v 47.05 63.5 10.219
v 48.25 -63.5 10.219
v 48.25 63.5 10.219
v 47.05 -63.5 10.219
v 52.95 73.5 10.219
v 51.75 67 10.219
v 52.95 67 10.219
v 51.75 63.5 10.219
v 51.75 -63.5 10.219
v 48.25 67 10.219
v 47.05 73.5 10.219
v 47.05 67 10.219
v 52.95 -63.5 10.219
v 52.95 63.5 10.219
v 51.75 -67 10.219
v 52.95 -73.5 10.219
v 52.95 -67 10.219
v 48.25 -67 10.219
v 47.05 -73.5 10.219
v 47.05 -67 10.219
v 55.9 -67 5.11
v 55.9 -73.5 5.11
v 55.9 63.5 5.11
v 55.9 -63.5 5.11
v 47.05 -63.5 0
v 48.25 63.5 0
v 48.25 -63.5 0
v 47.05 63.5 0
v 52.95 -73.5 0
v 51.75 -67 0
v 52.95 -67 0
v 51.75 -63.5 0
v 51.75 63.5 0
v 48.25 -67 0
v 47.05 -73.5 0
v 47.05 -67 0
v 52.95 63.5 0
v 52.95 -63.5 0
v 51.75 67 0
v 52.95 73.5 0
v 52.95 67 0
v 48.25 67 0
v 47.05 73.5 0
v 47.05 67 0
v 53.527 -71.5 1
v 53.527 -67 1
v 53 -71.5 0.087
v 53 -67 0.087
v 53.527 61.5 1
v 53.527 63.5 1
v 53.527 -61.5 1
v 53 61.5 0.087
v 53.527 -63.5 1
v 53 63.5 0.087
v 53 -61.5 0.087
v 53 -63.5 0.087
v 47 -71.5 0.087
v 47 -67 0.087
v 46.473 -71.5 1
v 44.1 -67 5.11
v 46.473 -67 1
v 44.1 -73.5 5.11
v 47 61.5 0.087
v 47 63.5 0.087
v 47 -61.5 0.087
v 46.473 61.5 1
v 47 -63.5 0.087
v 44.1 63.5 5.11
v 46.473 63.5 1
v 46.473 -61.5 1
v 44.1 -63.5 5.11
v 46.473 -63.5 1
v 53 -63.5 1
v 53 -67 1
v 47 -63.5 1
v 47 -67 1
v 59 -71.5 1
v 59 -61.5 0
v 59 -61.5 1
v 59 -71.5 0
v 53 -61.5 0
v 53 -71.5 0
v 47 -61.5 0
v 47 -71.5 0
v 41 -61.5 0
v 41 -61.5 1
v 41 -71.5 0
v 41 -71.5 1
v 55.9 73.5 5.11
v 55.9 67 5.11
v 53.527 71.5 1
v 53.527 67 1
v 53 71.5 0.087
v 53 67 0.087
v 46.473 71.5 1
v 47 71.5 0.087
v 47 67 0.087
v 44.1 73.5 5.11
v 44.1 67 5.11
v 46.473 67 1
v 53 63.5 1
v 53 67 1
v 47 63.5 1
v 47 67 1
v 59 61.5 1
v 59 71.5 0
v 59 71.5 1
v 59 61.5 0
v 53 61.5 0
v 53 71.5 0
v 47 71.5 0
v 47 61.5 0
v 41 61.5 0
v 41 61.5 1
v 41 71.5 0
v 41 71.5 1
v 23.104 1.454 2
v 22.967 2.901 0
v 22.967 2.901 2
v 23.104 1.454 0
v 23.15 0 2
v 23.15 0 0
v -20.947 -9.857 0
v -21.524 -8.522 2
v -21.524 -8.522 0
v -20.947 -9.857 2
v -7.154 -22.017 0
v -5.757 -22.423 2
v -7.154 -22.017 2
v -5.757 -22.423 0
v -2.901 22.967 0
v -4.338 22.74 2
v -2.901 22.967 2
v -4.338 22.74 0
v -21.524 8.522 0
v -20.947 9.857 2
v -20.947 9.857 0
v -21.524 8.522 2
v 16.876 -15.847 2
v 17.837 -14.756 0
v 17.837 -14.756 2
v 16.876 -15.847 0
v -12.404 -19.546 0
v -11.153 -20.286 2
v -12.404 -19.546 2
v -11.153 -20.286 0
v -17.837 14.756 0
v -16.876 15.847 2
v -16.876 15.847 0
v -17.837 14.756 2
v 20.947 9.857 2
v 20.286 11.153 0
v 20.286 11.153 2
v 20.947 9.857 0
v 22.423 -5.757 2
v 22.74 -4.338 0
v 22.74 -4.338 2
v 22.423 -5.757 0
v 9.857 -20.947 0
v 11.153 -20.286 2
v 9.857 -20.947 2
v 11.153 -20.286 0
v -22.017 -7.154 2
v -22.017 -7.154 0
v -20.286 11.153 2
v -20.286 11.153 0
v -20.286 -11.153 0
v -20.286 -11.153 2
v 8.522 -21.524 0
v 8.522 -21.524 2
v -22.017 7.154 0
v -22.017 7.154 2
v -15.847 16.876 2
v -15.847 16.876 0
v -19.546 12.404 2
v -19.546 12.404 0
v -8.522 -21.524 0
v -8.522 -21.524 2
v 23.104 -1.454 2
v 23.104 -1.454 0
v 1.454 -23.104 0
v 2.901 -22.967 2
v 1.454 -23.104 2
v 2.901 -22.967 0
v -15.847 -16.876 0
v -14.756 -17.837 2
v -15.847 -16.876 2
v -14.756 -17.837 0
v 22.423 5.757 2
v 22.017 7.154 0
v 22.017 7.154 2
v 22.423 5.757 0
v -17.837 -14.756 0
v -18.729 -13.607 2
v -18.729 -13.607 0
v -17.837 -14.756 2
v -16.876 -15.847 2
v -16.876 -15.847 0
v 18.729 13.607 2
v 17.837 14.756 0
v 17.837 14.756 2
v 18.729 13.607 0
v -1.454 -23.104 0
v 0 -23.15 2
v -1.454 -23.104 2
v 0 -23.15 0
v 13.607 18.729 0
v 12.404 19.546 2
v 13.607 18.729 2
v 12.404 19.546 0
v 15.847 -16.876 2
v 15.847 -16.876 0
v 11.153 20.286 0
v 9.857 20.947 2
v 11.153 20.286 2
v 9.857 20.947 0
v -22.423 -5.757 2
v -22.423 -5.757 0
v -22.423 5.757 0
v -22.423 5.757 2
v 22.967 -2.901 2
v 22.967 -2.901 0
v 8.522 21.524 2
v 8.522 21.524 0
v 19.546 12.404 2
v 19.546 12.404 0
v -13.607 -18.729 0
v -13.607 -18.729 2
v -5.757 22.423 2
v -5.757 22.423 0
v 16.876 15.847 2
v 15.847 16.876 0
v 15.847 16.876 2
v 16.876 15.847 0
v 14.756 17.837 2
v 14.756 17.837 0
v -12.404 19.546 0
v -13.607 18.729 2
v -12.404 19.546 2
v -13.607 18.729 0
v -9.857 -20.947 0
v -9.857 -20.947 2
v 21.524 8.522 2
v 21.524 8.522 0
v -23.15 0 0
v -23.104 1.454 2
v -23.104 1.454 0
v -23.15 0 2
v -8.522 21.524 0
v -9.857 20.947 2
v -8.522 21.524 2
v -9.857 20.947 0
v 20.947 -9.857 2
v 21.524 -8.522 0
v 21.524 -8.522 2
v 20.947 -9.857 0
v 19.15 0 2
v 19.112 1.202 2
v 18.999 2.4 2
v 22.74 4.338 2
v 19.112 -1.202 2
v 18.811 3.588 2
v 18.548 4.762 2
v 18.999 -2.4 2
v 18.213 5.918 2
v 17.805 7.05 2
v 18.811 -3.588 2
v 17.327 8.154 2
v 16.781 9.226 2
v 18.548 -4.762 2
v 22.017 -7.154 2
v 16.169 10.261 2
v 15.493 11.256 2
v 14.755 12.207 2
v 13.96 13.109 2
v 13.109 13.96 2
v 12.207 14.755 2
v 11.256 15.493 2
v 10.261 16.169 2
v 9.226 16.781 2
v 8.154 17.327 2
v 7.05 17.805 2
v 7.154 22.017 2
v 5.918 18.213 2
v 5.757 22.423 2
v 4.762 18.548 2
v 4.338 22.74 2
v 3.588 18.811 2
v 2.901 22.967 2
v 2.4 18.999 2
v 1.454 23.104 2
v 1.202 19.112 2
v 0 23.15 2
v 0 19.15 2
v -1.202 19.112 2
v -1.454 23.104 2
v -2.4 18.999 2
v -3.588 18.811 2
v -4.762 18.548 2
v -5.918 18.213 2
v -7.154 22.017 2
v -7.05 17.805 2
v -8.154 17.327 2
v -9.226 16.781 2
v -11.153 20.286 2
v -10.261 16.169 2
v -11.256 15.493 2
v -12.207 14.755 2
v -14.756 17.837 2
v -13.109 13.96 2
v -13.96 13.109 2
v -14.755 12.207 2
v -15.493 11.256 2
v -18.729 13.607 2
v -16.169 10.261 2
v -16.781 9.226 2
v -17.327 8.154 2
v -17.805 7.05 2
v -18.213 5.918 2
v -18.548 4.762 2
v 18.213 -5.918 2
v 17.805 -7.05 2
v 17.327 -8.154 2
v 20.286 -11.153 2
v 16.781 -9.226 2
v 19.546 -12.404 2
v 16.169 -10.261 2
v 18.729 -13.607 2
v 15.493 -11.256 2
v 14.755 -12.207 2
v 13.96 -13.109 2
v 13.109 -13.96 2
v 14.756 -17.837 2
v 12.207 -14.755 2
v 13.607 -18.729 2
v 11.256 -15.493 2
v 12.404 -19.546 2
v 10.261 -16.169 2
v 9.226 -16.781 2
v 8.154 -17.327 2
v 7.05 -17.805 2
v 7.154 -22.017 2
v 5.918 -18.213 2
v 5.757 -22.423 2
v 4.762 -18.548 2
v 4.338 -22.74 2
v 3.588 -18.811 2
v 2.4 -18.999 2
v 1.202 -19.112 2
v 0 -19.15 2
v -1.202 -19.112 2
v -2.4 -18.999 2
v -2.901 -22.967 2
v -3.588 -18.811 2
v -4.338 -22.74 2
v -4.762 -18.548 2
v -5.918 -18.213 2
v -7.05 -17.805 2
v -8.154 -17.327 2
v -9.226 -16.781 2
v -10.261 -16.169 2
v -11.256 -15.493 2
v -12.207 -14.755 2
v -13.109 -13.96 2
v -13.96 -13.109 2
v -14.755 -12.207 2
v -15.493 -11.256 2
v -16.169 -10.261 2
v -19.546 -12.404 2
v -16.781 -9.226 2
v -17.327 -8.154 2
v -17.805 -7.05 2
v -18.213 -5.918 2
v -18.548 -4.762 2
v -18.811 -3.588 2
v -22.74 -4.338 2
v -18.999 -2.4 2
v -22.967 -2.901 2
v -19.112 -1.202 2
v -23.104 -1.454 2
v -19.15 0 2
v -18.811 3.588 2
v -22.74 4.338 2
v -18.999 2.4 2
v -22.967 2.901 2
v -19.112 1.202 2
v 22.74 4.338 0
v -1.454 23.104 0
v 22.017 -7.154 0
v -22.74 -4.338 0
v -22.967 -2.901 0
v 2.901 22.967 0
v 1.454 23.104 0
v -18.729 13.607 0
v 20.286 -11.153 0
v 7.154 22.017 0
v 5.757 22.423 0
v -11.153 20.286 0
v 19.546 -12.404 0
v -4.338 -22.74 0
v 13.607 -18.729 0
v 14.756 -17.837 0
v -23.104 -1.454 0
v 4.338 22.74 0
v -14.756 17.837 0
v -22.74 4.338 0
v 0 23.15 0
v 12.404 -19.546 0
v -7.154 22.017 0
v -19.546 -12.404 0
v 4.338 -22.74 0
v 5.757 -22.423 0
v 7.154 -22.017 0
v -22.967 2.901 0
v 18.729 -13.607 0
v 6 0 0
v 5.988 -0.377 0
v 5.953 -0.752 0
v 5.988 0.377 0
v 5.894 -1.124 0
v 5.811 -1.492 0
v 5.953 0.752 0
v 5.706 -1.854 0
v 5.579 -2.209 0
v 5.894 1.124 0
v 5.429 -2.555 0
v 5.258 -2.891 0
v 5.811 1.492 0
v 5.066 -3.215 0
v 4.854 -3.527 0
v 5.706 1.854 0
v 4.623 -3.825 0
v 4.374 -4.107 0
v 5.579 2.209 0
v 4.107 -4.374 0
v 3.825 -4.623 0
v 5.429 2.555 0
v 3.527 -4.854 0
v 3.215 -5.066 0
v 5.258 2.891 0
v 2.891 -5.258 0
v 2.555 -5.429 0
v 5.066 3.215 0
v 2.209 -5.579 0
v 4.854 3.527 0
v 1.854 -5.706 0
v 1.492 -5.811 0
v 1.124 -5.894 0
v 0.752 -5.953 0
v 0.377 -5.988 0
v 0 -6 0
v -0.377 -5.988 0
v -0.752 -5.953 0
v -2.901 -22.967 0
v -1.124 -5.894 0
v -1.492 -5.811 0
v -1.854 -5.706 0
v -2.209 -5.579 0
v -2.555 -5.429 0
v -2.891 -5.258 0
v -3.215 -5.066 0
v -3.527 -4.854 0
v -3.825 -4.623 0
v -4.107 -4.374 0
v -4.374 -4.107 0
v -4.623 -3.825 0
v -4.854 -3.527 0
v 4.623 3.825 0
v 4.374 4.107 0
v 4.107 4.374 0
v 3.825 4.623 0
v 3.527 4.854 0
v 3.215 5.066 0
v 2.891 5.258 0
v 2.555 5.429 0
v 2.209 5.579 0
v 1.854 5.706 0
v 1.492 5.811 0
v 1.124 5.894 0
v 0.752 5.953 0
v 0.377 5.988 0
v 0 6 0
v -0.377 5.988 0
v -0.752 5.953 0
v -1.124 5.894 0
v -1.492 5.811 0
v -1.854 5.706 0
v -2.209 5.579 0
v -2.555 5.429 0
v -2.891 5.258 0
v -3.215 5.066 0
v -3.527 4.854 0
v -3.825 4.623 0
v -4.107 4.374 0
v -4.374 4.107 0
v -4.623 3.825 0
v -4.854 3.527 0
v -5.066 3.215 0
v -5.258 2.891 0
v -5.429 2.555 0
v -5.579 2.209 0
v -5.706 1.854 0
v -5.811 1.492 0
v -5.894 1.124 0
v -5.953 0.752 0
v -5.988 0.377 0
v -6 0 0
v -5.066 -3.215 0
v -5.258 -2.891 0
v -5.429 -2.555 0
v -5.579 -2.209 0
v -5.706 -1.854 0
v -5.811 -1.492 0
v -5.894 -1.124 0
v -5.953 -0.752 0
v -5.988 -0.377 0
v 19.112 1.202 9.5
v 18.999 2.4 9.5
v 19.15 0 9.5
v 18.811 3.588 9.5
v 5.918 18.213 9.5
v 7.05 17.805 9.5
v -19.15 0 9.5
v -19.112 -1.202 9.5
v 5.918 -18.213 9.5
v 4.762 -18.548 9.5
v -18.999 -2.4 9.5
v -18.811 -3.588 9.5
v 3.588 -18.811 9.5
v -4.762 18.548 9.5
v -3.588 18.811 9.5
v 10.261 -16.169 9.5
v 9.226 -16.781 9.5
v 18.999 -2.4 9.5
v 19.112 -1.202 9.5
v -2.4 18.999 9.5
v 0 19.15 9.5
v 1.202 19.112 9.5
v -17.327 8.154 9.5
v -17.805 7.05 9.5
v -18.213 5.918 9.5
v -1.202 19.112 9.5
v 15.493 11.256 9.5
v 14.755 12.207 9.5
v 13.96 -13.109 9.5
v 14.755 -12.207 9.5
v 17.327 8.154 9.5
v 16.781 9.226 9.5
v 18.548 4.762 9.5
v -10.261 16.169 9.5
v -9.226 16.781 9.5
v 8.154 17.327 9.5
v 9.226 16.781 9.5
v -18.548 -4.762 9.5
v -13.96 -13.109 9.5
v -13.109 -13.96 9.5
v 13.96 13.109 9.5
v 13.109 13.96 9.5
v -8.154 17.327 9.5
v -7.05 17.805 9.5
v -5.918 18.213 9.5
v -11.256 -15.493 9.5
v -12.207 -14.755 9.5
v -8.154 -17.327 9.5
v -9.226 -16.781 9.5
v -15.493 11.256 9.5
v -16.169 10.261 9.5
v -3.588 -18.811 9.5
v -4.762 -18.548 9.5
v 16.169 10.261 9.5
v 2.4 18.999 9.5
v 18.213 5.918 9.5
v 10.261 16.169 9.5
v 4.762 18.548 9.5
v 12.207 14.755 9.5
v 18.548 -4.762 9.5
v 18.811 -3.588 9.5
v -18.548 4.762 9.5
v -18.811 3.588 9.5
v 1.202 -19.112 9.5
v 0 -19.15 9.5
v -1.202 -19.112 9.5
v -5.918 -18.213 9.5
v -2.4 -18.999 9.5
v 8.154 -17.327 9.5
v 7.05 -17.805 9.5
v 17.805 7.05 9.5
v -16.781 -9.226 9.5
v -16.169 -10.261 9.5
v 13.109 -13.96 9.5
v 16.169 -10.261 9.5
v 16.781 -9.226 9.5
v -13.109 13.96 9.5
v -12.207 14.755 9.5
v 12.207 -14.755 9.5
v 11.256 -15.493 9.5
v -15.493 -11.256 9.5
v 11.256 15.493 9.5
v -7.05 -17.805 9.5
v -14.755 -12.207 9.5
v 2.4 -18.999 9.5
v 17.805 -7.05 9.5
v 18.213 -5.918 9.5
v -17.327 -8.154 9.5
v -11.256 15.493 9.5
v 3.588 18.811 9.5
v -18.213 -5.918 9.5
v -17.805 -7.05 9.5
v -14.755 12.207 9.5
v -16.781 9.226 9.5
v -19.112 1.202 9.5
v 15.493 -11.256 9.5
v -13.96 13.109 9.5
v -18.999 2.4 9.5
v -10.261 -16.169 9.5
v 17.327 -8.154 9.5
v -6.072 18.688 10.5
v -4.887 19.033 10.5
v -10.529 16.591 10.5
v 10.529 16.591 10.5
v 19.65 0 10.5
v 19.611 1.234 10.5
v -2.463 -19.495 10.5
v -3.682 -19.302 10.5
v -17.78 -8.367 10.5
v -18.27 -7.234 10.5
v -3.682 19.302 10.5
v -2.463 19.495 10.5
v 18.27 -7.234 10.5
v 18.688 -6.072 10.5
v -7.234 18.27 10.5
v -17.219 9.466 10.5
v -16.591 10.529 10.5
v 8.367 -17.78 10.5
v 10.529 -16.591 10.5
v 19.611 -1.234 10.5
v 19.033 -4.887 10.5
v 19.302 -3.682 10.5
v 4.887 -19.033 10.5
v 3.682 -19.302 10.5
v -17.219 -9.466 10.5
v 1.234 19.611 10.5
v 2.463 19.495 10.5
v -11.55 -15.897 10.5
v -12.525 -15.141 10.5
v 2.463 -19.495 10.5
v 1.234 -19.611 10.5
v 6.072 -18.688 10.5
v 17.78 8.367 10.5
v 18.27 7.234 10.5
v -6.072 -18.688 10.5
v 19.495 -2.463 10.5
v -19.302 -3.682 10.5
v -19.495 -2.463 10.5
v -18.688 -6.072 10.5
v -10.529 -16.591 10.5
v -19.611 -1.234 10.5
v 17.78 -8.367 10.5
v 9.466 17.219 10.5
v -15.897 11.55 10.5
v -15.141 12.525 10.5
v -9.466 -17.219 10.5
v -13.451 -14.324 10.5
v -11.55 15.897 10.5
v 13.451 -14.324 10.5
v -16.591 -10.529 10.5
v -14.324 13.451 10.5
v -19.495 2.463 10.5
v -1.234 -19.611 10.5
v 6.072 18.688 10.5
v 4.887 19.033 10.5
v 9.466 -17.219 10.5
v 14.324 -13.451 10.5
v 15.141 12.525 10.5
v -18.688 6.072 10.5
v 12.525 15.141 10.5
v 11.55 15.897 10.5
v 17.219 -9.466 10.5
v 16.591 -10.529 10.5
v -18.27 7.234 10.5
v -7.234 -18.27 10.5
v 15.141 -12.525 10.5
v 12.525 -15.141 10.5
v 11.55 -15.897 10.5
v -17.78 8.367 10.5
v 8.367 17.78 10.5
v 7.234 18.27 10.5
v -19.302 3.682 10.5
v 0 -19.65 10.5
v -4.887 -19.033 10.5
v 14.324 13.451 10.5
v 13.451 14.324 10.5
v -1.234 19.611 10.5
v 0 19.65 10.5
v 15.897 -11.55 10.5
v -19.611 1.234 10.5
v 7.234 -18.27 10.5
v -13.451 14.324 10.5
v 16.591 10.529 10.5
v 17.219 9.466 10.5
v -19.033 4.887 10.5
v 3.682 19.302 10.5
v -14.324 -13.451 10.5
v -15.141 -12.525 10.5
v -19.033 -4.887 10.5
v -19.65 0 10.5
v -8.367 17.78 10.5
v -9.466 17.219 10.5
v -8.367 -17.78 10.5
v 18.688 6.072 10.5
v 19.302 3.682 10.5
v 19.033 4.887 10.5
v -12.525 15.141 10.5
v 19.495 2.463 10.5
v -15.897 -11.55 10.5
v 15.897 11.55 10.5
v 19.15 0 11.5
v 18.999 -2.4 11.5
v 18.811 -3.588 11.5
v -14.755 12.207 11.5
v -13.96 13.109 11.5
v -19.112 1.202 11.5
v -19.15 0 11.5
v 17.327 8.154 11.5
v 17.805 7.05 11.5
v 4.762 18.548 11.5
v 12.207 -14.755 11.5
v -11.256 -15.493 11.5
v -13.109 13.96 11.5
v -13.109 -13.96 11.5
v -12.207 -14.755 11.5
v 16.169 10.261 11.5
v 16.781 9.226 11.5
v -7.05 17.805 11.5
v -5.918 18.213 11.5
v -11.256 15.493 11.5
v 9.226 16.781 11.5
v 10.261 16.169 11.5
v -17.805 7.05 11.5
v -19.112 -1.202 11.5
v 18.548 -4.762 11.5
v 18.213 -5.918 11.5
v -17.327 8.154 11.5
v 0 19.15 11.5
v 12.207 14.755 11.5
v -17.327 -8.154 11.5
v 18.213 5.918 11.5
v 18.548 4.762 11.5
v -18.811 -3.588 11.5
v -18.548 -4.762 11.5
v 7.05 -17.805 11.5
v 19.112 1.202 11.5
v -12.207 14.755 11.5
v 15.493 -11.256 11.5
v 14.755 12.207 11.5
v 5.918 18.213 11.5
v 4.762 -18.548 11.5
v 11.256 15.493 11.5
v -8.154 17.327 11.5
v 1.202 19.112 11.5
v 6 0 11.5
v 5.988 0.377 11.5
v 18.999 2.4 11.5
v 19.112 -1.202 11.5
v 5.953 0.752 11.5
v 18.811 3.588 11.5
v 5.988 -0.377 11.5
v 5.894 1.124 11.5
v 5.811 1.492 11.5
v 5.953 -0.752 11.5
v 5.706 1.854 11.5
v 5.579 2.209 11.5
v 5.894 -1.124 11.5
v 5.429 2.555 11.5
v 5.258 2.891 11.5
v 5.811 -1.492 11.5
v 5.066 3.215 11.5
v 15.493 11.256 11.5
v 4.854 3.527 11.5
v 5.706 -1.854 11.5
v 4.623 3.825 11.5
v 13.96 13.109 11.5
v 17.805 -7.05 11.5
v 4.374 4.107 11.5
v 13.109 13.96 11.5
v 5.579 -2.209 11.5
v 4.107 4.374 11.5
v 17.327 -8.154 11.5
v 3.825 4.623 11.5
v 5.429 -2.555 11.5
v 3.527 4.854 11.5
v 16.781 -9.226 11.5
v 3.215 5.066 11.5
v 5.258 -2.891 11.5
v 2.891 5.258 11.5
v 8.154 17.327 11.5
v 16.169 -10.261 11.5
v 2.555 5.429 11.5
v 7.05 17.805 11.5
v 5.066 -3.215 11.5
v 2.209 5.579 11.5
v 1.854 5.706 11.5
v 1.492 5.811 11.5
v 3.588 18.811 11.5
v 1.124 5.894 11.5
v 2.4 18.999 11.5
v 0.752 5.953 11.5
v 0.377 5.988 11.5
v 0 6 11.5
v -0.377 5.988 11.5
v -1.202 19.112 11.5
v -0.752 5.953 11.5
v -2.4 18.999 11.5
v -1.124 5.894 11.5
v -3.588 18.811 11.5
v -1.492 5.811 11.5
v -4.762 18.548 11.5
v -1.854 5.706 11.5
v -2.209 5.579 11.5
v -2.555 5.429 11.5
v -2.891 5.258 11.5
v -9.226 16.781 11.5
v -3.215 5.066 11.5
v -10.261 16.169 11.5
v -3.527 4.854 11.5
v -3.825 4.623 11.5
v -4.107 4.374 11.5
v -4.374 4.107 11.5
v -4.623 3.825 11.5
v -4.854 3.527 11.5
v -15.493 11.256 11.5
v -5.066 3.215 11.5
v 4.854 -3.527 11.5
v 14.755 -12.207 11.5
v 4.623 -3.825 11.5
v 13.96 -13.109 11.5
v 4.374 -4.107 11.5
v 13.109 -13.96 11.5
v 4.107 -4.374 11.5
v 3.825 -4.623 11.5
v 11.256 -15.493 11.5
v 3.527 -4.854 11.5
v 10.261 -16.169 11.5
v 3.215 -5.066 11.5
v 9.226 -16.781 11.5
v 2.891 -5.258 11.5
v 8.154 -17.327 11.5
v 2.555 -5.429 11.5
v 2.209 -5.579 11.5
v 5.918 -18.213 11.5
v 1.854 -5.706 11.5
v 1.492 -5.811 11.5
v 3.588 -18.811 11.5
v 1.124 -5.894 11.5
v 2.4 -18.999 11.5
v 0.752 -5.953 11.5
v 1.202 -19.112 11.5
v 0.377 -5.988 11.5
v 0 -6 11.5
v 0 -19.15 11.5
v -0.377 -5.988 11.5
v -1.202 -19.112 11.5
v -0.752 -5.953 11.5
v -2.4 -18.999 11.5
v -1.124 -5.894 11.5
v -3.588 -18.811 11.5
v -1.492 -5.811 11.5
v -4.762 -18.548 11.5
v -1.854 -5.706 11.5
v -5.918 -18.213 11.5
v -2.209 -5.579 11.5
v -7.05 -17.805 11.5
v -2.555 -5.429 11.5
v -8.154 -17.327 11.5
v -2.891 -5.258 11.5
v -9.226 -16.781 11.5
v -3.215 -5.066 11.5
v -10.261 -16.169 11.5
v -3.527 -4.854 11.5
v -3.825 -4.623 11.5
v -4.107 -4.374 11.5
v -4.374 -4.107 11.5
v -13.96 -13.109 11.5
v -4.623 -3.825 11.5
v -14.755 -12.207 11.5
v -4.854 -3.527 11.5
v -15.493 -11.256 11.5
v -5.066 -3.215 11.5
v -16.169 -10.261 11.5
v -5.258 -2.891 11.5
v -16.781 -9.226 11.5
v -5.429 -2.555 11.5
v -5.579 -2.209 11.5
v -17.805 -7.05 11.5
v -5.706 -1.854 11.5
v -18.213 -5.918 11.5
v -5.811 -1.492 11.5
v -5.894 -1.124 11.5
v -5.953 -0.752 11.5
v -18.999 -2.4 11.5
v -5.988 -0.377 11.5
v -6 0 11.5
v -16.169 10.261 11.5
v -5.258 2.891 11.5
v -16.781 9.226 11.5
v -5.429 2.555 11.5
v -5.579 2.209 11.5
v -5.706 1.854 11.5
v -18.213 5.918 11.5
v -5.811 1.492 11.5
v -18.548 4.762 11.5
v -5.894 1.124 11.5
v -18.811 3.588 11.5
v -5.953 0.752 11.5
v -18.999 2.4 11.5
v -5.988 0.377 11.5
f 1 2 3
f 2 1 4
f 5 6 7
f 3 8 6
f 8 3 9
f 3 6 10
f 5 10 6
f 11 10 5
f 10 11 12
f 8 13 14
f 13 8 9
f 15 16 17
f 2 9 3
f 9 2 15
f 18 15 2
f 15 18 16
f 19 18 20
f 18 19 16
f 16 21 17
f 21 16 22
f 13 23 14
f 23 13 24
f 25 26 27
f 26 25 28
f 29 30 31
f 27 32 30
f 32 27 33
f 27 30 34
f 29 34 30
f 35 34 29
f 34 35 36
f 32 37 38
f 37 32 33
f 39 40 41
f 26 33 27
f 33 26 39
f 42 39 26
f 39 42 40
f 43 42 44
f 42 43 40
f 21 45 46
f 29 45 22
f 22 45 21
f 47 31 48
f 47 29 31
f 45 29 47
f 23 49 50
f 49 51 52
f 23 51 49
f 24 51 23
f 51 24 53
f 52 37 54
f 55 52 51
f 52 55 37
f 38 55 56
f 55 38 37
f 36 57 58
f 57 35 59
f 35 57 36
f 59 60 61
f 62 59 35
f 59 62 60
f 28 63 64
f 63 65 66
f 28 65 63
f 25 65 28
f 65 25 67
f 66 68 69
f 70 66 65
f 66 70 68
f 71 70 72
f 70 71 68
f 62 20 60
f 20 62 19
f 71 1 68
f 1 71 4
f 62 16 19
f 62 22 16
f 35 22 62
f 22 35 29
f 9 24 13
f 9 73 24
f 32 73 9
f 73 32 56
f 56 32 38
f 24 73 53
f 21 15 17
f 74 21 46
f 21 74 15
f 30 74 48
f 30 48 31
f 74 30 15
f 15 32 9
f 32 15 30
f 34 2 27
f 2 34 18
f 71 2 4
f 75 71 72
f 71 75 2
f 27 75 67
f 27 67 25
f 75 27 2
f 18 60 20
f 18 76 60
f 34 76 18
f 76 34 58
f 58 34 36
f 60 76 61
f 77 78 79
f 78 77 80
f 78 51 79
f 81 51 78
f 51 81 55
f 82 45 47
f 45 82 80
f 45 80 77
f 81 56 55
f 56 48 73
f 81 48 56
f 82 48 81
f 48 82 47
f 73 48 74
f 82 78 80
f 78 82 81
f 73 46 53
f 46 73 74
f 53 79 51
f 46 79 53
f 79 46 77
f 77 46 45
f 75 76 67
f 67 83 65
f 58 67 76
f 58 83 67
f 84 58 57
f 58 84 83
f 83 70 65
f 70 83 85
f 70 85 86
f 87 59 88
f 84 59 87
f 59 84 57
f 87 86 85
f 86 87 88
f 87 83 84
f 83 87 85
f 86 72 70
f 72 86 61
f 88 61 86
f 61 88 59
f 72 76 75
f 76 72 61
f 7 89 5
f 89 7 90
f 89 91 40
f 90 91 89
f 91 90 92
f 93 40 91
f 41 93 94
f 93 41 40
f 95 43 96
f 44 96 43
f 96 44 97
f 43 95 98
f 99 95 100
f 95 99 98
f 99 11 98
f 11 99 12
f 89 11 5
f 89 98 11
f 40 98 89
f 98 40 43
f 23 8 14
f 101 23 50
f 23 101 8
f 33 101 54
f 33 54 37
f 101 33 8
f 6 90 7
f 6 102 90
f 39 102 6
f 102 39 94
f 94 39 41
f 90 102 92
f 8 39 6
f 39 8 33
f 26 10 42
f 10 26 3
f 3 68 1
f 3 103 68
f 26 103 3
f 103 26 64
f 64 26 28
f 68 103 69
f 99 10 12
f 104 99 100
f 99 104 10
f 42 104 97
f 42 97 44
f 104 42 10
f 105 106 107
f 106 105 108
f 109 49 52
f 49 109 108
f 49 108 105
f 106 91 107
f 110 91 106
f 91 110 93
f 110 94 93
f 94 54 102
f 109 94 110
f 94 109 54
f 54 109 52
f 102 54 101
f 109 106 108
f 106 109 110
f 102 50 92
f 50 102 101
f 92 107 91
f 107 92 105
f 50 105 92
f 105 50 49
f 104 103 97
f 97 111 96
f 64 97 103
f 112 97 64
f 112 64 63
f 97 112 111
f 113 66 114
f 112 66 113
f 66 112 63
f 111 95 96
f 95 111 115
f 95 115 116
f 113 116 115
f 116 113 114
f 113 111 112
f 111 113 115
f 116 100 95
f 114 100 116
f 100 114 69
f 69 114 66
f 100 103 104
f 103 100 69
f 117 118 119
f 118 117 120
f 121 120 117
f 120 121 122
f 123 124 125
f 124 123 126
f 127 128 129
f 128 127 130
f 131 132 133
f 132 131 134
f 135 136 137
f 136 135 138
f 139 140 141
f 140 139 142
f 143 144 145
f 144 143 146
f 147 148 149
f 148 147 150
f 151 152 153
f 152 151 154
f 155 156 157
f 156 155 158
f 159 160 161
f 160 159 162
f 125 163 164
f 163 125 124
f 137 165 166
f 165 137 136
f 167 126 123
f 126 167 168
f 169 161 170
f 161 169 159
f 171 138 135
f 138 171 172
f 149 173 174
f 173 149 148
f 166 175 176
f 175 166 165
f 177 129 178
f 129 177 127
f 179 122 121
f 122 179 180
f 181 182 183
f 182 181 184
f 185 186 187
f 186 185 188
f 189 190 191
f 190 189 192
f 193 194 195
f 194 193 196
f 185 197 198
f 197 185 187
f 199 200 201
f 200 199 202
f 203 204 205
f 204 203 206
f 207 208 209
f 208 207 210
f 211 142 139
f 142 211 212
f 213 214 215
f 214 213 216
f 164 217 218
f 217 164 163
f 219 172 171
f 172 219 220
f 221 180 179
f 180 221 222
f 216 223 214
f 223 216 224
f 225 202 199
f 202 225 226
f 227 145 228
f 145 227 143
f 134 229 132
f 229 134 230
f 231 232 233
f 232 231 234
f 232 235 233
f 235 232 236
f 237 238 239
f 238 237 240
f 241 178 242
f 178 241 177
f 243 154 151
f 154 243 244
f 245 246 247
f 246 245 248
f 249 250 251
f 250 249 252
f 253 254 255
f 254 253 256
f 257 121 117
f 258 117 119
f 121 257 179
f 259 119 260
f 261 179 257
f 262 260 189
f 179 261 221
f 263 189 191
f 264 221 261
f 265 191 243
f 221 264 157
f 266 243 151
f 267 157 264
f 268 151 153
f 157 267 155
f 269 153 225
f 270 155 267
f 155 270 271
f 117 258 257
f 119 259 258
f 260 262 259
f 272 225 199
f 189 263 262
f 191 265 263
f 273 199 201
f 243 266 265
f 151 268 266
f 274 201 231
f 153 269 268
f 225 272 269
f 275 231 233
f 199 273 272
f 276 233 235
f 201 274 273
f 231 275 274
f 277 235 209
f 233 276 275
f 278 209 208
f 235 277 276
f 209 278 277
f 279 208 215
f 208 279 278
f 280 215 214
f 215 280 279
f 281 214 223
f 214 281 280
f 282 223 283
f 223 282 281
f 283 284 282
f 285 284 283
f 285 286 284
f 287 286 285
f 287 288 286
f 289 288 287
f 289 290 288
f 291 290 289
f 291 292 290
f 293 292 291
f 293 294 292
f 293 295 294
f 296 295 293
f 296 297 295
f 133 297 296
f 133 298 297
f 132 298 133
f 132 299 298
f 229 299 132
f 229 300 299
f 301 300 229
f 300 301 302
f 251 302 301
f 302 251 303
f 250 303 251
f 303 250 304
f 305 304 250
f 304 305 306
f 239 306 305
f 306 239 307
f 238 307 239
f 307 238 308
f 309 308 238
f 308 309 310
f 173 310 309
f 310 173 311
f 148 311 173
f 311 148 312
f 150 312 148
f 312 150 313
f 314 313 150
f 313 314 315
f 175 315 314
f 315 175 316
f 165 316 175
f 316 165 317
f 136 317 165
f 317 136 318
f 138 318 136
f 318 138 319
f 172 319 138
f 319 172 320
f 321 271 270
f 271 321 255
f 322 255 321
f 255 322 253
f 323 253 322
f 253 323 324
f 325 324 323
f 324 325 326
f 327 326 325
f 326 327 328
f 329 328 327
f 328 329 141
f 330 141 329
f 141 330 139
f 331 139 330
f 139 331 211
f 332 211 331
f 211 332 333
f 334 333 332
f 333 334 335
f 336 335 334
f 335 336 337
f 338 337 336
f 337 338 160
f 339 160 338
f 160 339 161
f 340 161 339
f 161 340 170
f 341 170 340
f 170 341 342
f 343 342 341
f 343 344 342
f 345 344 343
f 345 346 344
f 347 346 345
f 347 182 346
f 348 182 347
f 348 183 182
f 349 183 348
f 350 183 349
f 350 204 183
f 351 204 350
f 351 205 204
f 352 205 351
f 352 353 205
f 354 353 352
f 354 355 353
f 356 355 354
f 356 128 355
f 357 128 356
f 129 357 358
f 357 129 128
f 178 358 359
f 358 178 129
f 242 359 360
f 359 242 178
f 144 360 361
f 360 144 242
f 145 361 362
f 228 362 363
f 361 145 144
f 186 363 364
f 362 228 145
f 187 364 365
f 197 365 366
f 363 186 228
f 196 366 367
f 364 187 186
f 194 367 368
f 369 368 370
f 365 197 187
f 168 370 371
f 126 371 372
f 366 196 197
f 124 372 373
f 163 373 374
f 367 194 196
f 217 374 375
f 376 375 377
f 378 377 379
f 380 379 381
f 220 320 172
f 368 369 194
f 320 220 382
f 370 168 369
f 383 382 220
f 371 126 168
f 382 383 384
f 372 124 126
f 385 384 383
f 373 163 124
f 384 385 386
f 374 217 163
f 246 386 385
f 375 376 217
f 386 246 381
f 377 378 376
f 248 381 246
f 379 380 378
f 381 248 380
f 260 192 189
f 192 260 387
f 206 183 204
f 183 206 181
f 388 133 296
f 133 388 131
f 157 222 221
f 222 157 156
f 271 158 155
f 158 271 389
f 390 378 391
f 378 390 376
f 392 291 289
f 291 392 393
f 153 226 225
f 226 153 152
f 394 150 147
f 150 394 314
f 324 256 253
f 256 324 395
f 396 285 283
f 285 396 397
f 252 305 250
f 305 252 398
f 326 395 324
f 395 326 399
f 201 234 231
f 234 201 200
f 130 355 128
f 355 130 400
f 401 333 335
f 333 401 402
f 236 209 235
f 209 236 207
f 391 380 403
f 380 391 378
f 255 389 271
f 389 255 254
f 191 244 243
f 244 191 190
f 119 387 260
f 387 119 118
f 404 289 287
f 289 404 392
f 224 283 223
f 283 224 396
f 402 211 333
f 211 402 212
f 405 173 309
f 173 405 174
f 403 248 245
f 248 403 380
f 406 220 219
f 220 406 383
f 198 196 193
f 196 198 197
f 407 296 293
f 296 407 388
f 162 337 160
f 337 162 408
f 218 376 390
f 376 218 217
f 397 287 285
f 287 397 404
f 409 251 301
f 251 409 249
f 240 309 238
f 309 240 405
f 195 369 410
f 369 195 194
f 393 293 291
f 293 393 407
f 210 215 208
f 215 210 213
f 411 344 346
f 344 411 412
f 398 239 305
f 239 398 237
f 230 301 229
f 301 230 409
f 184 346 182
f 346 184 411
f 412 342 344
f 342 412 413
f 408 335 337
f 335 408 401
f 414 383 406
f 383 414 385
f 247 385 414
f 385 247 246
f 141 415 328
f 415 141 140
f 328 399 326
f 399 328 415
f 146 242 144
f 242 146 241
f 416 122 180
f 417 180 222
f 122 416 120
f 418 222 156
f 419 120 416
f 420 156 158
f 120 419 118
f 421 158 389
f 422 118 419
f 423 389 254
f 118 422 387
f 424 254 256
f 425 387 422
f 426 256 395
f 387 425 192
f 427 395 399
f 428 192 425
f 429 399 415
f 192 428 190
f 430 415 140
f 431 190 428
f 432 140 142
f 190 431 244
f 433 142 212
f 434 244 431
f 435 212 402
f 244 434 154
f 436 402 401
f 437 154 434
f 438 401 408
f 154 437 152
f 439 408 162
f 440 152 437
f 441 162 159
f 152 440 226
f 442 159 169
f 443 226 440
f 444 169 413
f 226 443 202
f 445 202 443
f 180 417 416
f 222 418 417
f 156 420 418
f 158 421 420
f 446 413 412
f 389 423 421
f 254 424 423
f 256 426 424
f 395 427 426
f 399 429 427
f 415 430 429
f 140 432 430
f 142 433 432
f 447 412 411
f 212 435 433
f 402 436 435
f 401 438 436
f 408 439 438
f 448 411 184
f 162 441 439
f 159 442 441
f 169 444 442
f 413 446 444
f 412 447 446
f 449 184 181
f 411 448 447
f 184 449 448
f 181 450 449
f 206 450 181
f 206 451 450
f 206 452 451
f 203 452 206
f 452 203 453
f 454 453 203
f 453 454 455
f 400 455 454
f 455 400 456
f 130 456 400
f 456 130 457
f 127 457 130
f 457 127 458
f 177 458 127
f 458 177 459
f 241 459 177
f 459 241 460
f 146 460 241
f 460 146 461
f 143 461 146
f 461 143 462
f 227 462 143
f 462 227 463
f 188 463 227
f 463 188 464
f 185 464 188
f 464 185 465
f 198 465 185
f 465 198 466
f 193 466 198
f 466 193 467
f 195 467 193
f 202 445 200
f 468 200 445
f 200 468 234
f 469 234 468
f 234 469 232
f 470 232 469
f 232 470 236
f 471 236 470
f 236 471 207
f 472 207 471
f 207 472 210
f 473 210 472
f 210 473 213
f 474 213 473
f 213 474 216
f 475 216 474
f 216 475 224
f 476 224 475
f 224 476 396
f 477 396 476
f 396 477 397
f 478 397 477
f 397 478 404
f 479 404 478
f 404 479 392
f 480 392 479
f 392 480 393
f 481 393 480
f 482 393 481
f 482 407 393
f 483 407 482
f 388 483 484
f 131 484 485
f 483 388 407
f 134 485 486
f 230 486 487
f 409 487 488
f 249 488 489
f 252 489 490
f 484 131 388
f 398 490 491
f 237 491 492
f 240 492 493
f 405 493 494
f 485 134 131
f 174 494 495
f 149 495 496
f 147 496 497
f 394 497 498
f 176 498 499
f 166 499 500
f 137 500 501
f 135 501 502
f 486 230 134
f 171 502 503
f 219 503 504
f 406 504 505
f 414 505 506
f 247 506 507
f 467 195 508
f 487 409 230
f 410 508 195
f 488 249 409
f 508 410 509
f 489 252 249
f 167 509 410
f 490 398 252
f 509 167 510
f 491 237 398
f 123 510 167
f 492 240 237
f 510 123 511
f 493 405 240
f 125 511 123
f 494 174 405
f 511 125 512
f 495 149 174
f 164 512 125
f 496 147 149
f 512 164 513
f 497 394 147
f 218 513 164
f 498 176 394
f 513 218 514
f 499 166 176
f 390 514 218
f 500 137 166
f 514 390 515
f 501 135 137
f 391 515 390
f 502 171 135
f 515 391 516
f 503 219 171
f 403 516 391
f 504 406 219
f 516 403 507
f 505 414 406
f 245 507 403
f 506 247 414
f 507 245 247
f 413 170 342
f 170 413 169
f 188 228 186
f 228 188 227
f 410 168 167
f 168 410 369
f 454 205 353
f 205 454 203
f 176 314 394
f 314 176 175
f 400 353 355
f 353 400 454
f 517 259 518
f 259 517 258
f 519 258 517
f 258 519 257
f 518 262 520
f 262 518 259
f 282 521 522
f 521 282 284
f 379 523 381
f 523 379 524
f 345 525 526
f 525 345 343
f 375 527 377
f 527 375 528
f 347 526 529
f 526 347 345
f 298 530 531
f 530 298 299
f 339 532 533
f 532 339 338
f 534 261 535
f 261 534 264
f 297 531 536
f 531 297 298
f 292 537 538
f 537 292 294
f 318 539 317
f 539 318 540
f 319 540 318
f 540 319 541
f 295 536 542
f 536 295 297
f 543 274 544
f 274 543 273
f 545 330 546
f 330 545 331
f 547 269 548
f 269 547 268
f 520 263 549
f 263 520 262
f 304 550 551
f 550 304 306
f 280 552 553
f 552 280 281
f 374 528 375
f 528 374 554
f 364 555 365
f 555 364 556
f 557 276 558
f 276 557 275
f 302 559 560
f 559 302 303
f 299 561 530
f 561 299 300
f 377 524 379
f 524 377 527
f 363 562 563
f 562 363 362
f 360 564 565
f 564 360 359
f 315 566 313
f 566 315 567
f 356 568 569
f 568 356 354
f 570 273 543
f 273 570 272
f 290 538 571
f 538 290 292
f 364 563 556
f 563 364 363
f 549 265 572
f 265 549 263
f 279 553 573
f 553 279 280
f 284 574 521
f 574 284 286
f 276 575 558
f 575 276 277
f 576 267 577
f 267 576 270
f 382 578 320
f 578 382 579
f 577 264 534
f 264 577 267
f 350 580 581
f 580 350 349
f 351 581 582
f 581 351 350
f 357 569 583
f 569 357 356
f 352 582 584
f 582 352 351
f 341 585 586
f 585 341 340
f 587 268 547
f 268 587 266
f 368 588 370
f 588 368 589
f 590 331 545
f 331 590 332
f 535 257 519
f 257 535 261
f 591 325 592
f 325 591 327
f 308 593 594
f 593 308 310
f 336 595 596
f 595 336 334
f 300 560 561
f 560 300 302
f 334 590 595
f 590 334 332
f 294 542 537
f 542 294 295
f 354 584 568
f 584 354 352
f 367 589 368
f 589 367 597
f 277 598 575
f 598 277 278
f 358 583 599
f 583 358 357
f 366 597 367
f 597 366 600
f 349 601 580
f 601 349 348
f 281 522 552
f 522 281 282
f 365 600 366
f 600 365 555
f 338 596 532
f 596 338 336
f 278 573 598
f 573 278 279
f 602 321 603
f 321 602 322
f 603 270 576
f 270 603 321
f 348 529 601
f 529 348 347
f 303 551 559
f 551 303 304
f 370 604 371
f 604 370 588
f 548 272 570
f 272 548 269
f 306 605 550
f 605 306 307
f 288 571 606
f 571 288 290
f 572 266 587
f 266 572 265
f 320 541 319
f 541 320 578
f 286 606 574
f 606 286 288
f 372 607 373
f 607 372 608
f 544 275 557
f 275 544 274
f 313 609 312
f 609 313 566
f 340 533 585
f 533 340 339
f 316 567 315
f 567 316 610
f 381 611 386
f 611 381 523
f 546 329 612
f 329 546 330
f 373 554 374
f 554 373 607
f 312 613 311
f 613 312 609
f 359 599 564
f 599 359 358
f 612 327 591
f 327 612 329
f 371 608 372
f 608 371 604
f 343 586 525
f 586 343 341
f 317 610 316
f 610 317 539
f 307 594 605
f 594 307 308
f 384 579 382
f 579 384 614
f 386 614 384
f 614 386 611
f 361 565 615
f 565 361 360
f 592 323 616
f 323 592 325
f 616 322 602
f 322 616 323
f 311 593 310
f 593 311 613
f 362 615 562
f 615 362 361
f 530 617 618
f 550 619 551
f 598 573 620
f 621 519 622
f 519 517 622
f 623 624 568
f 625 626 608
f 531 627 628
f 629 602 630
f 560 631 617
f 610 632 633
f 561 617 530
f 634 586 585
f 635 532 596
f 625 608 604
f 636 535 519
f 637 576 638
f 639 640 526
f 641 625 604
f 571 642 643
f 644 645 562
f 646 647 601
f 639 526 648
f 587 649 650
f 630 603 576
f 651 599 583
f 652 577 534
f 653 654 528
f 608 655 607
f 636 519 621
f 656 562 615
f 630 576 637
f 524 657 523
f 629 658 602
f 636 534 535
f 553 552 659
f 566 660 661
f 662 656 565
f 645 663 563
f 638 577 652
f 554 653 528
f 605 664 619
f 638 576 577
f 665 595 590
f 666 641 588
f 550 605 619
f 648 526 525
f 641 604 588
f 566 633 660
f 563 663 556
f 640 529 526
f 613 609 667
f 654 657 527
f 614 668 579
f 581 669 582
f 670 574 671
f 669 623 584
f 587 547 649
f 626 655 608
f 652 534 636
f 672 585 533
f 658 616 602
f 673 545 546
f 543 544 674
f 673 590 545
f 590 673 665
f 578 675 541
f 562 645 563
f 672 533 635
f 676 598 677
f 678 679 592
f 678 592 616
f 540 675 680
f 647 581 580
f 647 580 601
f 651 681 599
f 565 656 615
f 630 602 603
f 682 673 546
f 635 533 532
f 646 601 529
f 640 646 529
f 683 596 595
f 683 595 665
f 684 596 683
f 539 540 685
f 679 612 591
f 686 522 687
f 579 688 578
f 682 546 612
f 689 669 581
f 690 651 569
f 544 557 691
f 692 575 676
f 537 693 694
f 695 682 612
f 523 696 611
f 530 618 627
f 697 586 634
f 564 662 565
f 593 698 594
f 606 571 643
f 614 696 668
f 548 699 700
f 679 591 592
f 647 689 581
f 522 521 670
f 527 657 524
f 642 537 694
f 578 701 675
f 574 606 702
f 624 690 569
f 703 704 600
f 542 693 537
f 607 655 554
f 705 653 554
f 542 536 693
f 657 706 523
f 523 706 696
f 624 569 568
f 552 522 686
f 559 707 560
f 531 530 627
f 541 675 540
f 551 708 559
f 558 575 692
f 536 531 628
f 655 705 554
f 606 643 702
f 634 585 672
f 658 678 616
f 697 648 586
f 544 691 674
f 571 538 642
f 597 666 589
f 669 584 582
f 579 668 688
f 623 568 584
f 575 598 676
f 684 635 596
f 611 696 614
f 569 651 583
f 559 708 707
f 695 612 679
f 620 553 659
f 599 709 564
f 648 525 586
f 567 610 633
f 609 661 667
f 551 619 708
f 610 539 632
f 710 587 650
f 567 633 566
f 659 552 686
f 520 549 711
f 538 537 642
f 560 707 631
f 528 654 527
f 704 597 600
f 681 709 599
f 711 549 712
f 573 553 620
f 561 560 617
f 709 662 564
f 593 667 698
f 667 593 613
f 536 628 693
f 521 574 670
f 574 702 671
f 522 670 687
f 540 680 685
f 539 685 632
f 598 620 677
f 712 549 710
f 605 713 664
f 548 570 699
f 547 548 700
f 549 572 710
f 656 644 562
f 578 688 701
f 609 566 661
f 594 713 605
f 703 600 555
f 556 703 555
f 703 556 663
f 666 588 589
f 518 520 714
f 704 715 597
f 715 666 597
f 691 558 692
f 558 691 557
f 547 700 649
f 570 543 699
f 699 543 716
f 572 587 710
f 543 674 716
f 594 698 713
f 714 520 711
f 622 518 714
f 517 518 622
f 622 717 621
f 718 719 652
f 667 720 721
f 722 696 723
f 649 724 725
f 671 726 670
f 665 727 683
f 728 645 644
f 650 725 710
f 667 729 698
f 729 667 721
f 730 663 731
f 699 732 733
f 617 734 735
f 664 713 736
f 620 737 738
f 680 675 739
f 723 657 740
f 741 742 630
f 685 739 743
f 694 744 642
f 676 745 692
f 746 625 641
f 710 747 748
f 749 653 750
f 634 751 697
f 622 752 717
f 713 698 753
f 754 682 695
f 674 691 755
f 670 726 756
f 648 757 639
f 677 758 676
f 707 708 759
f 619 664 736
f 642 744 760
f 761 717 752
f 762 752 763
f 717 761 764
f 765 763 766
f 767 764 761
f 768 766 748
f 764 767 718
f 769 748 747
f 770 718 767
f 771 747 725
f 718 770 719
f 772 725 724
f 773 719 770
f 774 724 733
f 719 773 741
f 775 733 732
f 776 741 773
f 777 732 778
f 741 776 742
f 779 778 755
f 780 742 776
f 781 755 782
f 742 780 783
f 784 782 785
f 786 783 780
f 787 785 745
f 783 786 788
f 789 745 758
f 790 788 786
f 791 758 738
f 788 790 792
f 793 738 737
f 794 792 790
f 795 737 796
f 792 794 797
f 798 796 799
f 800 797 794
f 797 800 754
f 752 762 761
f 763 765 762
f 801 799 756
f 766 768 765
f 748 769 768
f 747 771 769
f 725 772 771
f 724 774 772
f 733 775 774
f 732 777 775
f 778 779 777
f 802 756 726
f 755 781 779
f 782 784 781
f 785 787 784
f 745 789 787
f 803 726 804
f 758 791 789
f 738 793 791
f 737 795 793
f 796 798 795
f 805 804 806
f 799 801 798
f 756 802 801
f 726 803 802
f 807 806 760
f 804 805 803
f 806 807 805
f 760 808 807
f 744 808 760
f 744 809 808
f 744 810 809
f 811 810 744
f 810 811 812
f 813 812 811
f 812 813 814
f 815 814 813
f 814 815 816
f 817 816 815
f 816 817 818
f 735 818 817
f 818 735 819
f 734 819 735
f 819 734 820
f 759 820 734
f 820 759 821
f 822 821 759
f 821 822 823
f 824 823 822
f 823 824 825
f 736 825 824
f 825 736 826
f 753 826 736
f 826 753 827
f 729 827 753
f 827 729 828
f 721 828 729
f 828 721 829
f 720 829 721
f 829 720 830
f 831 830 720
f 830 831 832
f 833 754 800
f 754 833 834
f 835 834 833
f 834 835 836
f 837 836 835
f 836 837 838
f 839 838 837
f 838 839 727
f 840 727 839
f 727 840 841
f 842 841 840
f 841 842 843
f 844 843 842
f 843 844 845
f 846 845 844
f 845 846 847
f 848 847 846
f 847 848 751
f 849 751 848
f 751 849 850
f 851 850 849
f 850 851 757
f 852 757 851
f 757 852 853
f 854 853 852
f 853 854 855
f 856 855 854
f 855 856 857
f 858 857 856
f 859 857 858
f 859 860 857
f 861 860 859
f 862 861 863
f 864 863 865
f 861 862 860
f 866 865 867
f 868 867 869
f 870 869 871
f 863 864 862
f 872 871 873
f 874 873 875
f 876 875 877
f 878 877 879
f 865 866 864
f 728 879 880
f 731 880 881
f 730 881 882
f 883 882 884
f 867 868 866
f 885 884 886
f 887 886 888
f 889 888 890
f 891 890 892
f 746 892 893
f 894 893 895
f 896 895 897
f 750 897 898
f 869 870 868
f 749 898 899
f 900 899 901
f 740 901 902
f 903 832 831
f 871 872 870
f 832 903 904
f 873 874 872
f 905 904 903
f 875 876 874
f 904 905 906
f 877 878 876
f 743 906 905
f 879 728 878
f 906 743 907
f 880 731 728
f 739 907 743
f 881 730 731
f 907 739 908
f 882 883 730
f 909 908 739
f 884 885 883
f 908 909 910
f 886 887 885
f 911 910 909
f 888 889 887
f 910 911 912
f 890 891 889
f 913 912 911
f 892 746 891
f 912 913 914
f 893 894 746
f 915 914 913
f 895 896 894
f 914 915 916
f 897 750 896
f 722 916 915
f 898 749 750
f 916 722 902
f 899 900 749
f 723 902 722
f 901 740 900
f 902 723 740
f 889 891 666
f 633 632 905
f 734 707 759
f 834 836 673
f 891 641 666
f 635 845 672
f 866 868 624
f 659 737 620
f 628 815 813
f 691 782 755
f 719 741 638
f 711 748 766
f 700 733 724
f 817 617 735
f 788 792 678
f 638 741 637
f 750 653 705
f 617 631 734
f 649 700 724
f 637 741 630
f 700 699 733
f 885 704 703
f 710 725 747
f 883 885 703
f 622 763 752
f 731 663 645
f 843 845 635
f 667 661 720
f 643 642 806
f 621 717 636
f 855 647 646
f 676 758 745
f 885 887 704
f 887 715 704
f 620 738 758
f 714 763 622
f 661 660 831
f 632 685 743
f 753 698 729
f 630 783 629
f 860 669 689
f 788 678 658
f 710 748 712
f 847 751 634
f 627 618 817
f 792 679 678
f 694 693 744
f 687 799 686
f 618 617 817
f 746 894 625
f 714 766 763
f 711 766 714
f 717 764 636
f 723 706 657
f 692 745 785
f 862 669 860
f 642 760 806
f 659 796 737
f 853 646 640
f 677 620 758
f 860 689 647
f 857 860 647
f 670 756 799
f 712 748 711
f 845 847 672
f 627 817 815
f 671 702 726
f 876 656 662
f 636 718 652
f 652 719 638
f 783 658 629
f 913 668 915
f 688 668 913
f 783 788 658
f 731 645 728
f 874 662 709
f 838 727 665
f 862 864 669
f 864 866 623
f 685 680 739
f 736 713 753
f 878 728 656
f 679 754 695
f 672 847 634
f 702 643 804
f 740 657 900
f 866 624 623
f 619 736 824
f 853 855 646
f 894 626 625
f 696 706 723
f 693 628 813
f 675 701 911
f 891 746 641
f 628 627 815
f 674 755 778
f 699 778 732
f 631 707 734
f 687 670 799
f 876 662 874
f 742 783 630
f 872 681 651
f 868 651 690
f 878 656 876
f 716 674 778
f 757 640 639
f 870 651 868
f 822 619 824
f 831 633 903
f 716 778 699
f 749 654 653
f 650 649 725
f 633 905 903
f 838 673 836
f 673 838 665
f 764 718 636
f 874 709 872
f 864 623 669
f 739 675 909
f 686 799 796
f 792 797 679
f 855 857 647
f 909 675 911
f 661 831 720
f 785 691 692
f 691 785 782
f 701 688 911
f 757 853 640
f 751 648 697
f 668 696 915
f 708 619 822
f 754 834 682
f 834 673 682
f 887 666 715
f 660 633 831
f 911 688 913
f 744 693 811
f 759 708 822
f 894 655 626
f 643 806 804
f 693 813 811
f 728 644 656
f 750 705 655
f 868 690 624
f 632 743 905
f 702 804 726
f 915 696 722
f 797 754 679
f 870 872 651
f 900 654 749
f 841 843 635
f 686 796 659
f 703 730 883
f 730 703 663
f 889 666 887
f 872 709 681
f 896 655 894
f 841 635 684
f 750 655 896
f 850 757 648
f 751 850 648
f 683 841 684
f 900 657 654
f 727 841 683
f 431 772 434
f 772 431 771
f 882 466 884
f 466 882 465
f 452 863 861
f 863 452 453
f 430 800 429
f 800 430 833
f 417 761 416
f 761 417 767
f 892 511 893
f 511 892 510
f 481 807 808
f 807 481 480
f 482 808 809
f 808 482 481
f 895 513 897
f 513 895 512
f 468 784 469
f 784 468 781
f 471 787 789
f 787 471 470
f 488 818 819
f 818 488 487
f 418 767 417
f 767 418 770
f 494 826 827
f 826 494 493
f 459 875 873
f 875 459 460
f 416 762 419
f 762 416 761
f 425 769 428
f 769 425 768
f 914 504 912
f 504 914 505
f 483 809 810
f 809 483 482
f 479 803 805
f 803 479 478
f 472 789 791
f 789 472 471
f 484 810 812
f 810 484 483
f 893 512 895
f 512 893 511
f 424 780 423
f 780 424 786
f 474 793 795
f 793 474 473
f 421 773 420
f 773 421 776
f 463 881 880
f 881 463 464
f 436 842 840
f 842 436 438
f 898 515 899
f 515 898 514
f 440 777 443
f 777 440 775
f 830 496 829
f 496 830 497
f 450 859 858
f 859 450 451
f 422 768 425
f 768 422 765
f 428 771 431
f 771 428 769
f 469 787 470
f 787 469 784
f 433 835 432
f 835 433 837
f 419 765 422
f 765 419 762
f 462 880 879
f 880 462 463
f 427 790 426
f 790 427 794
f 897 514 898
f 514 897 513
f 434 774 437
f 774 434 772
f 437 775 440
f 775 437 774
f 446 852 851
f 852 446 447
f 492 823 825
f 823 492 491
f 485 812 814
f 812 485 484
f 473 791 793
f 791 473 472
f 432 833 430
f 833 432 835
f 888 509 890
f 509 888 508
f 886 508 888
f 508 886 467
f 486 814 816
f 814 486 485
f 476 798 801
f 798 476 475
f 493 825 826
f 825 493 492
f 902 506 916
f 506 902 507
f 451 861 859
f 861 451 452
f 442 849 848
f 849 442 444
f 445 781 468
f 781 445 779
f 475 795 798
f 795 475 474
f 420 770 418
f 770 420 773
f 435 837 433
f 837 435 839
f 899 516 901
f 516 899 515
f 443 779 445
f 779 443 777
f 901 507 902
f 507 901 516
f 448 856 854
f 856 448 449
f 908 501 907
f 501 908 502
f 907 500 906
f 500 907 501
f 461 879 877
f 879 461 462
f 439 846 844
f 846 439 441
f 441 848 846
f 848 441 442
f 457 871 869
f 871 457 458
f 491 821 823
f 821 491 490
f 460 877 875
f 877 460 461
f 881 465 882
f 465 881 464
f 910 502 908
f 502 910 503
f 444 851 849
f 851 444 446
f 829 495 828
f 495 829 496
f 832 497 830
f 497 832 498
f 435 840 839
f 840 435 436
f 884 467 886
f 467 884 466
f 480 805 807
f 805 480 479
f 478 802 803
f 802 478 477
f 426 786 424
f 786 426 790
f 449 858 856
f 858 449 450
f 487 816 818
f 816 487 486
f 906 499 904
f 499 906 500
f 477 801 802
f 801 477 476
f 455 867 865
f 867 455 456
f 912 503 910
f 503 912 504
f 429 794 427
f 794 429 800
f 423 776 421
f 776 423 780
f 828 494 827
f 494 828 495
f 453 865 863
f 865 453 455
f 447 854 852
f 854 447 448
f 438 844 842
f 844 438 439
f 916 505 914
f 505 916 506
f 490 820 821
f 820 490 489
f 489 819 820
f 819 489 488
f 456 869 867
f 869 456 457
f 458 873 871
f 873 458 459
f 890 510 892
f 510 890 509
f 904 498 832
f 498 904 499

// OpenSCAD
/////////////////////////////////////////////////////////////////////
////////////////////Support for filamentrolls ///////////////////
///////////////////iprusa 3 P3Steel www.printer3d.com////////////////////////
/*date:04-09-2015
programmed by: ruudoleo
license:
program: Openscad

*/

/////////////////////////////////////////////////////////////////////
////////////////////////////Parameters//////////////////////////

/*[roller and hexas]*/
    holedia=12;
    tolerance=0.2;  
    rollerdiameter=38.5;
/*[roller]*/
    rollerdepth=11;
    seamheightinside=1;
    brimoutsidethickness=2;
    brimoutsideheight=4;
    
/*[Hexas]*/
   supportdist=127;
   supportthickness=3.5;

/*[Print what]*/
part="both";//[hexas:hexas,centerring:centerring,both:both]

/*[Hidden]*/
   hexwidth=(holedia-tolerance)*sqrt(3)/2;
   hexlenght=supportdist/2+10;
   rollerdia=rollerdiameter-tolerance;
//////////////rendering//
if (part=="hexas"){ 
    translate([0,0,hexwidth/2])
 hex_As();   
}// endif
else{
    if (part=="centerring"){
     center_Ring();    
    }//end if
    else{
        translate([50,0,hexwidth/2])
      hex_As();
      center_Ring();  
    }//end else
} // end if
  
//////////////////modules///////
   //*****filamentrollersupport***
module hex_As(){
    rotate(a=270,v=[1,0,0])
     hexas(supportthickness,supportdist,hexlenght,holedia,hexwidth,tolerance);  
    
}// end module
module center_Ring(){
        support(rollerdia,rollerdepth,seamheightinside,brimoutsidethickness,brimoutsideheight);
}//end module


module support(rollerdia,rollerdepth,seamhightinside,brimoutsidethickness,brimoutsideheight){
      difference(){
      union(){
        //brim outside
          translate([0,0,brimoutsidethickness/2])
            cylinder(d=rollerdia+brimoutsideheight*2,h=brimoutsidethickness,center=true,$fn=100);
        //main cylinder
         translate([0,0,rollerdepth/2])
                 cylinder(d=rollerdia,h=rollerdepth,center=true,$fn=100);
         //brim inside 
         translate([0,0,rollerdepth-1])
            cylinder(r1=rollerdia/2,r2=rollerdia/2+seamheightinside/2,h=1,center=true,$fn=100);
         translate([0,0,rollerdepth])
             cylinder(r1=rollerdia/2+seamheightinside/2,r2=rollerdia/2,h=1,center=true,$fn=100);
    
  
}


// make hole
translate([0,0,rollerdepth/2])
                cylinder(d=holedia,h=rollerdepth+10,center=true,$fn=100);
}
}




     //*************hex as**********
     module hexas(supportthickness,supportdist,hexlenght,holedia,hexwidth,tolerance){
     halfhexas(supportthickness,supportdist,hexlenght,holedia,hexwidth,tolerance);
     mirror([0,0,1])
     halfhexas(supportthickness,supportdist,hexlenght,holedia,hexwidth,tolerance);
   }
     //*************halfhex as**********
     module halfhexas(supportthickness,supportdist,hexlenght,holedia,hexwidth,tolerance){
     difference(){
            //hexagonale as 
            translate([0,0,-hexlenght/2])
                cylinder(d=holedia-tolerance,h=hexlenght,center=true,$fn=6);
 
         
         //delete grooves
           translate([supportthickness/2,-hexwidth,-supportdist/2-supportthickness])
            cube(size=[hexwidth,hexwidth*2,supportthickness],center=false);
           translate([-hexwidth-supportthickness/2,-hexwidth,-supportdist/2-supportthickness])
             cube(size=[hexwidth,hexwidth*2,supportthickness],center=false);           
      }
               //////antiwarpsupport 3D print///
             translate([holedia*0.5,hexwidth/2-0.5,-hexlenght/2-supportdist/4+2])
                cube(size=[holedia/2,1,hexlenght-supportdist/2],center=true);
     
     
        translate([-holedia*0.5,hexwidth/2-0.5,-hexlenght/2-supportdist/4+2])
                cube(size=[holedia/2,1,hexlenght-supportdist/2],center=true);
  }
     
